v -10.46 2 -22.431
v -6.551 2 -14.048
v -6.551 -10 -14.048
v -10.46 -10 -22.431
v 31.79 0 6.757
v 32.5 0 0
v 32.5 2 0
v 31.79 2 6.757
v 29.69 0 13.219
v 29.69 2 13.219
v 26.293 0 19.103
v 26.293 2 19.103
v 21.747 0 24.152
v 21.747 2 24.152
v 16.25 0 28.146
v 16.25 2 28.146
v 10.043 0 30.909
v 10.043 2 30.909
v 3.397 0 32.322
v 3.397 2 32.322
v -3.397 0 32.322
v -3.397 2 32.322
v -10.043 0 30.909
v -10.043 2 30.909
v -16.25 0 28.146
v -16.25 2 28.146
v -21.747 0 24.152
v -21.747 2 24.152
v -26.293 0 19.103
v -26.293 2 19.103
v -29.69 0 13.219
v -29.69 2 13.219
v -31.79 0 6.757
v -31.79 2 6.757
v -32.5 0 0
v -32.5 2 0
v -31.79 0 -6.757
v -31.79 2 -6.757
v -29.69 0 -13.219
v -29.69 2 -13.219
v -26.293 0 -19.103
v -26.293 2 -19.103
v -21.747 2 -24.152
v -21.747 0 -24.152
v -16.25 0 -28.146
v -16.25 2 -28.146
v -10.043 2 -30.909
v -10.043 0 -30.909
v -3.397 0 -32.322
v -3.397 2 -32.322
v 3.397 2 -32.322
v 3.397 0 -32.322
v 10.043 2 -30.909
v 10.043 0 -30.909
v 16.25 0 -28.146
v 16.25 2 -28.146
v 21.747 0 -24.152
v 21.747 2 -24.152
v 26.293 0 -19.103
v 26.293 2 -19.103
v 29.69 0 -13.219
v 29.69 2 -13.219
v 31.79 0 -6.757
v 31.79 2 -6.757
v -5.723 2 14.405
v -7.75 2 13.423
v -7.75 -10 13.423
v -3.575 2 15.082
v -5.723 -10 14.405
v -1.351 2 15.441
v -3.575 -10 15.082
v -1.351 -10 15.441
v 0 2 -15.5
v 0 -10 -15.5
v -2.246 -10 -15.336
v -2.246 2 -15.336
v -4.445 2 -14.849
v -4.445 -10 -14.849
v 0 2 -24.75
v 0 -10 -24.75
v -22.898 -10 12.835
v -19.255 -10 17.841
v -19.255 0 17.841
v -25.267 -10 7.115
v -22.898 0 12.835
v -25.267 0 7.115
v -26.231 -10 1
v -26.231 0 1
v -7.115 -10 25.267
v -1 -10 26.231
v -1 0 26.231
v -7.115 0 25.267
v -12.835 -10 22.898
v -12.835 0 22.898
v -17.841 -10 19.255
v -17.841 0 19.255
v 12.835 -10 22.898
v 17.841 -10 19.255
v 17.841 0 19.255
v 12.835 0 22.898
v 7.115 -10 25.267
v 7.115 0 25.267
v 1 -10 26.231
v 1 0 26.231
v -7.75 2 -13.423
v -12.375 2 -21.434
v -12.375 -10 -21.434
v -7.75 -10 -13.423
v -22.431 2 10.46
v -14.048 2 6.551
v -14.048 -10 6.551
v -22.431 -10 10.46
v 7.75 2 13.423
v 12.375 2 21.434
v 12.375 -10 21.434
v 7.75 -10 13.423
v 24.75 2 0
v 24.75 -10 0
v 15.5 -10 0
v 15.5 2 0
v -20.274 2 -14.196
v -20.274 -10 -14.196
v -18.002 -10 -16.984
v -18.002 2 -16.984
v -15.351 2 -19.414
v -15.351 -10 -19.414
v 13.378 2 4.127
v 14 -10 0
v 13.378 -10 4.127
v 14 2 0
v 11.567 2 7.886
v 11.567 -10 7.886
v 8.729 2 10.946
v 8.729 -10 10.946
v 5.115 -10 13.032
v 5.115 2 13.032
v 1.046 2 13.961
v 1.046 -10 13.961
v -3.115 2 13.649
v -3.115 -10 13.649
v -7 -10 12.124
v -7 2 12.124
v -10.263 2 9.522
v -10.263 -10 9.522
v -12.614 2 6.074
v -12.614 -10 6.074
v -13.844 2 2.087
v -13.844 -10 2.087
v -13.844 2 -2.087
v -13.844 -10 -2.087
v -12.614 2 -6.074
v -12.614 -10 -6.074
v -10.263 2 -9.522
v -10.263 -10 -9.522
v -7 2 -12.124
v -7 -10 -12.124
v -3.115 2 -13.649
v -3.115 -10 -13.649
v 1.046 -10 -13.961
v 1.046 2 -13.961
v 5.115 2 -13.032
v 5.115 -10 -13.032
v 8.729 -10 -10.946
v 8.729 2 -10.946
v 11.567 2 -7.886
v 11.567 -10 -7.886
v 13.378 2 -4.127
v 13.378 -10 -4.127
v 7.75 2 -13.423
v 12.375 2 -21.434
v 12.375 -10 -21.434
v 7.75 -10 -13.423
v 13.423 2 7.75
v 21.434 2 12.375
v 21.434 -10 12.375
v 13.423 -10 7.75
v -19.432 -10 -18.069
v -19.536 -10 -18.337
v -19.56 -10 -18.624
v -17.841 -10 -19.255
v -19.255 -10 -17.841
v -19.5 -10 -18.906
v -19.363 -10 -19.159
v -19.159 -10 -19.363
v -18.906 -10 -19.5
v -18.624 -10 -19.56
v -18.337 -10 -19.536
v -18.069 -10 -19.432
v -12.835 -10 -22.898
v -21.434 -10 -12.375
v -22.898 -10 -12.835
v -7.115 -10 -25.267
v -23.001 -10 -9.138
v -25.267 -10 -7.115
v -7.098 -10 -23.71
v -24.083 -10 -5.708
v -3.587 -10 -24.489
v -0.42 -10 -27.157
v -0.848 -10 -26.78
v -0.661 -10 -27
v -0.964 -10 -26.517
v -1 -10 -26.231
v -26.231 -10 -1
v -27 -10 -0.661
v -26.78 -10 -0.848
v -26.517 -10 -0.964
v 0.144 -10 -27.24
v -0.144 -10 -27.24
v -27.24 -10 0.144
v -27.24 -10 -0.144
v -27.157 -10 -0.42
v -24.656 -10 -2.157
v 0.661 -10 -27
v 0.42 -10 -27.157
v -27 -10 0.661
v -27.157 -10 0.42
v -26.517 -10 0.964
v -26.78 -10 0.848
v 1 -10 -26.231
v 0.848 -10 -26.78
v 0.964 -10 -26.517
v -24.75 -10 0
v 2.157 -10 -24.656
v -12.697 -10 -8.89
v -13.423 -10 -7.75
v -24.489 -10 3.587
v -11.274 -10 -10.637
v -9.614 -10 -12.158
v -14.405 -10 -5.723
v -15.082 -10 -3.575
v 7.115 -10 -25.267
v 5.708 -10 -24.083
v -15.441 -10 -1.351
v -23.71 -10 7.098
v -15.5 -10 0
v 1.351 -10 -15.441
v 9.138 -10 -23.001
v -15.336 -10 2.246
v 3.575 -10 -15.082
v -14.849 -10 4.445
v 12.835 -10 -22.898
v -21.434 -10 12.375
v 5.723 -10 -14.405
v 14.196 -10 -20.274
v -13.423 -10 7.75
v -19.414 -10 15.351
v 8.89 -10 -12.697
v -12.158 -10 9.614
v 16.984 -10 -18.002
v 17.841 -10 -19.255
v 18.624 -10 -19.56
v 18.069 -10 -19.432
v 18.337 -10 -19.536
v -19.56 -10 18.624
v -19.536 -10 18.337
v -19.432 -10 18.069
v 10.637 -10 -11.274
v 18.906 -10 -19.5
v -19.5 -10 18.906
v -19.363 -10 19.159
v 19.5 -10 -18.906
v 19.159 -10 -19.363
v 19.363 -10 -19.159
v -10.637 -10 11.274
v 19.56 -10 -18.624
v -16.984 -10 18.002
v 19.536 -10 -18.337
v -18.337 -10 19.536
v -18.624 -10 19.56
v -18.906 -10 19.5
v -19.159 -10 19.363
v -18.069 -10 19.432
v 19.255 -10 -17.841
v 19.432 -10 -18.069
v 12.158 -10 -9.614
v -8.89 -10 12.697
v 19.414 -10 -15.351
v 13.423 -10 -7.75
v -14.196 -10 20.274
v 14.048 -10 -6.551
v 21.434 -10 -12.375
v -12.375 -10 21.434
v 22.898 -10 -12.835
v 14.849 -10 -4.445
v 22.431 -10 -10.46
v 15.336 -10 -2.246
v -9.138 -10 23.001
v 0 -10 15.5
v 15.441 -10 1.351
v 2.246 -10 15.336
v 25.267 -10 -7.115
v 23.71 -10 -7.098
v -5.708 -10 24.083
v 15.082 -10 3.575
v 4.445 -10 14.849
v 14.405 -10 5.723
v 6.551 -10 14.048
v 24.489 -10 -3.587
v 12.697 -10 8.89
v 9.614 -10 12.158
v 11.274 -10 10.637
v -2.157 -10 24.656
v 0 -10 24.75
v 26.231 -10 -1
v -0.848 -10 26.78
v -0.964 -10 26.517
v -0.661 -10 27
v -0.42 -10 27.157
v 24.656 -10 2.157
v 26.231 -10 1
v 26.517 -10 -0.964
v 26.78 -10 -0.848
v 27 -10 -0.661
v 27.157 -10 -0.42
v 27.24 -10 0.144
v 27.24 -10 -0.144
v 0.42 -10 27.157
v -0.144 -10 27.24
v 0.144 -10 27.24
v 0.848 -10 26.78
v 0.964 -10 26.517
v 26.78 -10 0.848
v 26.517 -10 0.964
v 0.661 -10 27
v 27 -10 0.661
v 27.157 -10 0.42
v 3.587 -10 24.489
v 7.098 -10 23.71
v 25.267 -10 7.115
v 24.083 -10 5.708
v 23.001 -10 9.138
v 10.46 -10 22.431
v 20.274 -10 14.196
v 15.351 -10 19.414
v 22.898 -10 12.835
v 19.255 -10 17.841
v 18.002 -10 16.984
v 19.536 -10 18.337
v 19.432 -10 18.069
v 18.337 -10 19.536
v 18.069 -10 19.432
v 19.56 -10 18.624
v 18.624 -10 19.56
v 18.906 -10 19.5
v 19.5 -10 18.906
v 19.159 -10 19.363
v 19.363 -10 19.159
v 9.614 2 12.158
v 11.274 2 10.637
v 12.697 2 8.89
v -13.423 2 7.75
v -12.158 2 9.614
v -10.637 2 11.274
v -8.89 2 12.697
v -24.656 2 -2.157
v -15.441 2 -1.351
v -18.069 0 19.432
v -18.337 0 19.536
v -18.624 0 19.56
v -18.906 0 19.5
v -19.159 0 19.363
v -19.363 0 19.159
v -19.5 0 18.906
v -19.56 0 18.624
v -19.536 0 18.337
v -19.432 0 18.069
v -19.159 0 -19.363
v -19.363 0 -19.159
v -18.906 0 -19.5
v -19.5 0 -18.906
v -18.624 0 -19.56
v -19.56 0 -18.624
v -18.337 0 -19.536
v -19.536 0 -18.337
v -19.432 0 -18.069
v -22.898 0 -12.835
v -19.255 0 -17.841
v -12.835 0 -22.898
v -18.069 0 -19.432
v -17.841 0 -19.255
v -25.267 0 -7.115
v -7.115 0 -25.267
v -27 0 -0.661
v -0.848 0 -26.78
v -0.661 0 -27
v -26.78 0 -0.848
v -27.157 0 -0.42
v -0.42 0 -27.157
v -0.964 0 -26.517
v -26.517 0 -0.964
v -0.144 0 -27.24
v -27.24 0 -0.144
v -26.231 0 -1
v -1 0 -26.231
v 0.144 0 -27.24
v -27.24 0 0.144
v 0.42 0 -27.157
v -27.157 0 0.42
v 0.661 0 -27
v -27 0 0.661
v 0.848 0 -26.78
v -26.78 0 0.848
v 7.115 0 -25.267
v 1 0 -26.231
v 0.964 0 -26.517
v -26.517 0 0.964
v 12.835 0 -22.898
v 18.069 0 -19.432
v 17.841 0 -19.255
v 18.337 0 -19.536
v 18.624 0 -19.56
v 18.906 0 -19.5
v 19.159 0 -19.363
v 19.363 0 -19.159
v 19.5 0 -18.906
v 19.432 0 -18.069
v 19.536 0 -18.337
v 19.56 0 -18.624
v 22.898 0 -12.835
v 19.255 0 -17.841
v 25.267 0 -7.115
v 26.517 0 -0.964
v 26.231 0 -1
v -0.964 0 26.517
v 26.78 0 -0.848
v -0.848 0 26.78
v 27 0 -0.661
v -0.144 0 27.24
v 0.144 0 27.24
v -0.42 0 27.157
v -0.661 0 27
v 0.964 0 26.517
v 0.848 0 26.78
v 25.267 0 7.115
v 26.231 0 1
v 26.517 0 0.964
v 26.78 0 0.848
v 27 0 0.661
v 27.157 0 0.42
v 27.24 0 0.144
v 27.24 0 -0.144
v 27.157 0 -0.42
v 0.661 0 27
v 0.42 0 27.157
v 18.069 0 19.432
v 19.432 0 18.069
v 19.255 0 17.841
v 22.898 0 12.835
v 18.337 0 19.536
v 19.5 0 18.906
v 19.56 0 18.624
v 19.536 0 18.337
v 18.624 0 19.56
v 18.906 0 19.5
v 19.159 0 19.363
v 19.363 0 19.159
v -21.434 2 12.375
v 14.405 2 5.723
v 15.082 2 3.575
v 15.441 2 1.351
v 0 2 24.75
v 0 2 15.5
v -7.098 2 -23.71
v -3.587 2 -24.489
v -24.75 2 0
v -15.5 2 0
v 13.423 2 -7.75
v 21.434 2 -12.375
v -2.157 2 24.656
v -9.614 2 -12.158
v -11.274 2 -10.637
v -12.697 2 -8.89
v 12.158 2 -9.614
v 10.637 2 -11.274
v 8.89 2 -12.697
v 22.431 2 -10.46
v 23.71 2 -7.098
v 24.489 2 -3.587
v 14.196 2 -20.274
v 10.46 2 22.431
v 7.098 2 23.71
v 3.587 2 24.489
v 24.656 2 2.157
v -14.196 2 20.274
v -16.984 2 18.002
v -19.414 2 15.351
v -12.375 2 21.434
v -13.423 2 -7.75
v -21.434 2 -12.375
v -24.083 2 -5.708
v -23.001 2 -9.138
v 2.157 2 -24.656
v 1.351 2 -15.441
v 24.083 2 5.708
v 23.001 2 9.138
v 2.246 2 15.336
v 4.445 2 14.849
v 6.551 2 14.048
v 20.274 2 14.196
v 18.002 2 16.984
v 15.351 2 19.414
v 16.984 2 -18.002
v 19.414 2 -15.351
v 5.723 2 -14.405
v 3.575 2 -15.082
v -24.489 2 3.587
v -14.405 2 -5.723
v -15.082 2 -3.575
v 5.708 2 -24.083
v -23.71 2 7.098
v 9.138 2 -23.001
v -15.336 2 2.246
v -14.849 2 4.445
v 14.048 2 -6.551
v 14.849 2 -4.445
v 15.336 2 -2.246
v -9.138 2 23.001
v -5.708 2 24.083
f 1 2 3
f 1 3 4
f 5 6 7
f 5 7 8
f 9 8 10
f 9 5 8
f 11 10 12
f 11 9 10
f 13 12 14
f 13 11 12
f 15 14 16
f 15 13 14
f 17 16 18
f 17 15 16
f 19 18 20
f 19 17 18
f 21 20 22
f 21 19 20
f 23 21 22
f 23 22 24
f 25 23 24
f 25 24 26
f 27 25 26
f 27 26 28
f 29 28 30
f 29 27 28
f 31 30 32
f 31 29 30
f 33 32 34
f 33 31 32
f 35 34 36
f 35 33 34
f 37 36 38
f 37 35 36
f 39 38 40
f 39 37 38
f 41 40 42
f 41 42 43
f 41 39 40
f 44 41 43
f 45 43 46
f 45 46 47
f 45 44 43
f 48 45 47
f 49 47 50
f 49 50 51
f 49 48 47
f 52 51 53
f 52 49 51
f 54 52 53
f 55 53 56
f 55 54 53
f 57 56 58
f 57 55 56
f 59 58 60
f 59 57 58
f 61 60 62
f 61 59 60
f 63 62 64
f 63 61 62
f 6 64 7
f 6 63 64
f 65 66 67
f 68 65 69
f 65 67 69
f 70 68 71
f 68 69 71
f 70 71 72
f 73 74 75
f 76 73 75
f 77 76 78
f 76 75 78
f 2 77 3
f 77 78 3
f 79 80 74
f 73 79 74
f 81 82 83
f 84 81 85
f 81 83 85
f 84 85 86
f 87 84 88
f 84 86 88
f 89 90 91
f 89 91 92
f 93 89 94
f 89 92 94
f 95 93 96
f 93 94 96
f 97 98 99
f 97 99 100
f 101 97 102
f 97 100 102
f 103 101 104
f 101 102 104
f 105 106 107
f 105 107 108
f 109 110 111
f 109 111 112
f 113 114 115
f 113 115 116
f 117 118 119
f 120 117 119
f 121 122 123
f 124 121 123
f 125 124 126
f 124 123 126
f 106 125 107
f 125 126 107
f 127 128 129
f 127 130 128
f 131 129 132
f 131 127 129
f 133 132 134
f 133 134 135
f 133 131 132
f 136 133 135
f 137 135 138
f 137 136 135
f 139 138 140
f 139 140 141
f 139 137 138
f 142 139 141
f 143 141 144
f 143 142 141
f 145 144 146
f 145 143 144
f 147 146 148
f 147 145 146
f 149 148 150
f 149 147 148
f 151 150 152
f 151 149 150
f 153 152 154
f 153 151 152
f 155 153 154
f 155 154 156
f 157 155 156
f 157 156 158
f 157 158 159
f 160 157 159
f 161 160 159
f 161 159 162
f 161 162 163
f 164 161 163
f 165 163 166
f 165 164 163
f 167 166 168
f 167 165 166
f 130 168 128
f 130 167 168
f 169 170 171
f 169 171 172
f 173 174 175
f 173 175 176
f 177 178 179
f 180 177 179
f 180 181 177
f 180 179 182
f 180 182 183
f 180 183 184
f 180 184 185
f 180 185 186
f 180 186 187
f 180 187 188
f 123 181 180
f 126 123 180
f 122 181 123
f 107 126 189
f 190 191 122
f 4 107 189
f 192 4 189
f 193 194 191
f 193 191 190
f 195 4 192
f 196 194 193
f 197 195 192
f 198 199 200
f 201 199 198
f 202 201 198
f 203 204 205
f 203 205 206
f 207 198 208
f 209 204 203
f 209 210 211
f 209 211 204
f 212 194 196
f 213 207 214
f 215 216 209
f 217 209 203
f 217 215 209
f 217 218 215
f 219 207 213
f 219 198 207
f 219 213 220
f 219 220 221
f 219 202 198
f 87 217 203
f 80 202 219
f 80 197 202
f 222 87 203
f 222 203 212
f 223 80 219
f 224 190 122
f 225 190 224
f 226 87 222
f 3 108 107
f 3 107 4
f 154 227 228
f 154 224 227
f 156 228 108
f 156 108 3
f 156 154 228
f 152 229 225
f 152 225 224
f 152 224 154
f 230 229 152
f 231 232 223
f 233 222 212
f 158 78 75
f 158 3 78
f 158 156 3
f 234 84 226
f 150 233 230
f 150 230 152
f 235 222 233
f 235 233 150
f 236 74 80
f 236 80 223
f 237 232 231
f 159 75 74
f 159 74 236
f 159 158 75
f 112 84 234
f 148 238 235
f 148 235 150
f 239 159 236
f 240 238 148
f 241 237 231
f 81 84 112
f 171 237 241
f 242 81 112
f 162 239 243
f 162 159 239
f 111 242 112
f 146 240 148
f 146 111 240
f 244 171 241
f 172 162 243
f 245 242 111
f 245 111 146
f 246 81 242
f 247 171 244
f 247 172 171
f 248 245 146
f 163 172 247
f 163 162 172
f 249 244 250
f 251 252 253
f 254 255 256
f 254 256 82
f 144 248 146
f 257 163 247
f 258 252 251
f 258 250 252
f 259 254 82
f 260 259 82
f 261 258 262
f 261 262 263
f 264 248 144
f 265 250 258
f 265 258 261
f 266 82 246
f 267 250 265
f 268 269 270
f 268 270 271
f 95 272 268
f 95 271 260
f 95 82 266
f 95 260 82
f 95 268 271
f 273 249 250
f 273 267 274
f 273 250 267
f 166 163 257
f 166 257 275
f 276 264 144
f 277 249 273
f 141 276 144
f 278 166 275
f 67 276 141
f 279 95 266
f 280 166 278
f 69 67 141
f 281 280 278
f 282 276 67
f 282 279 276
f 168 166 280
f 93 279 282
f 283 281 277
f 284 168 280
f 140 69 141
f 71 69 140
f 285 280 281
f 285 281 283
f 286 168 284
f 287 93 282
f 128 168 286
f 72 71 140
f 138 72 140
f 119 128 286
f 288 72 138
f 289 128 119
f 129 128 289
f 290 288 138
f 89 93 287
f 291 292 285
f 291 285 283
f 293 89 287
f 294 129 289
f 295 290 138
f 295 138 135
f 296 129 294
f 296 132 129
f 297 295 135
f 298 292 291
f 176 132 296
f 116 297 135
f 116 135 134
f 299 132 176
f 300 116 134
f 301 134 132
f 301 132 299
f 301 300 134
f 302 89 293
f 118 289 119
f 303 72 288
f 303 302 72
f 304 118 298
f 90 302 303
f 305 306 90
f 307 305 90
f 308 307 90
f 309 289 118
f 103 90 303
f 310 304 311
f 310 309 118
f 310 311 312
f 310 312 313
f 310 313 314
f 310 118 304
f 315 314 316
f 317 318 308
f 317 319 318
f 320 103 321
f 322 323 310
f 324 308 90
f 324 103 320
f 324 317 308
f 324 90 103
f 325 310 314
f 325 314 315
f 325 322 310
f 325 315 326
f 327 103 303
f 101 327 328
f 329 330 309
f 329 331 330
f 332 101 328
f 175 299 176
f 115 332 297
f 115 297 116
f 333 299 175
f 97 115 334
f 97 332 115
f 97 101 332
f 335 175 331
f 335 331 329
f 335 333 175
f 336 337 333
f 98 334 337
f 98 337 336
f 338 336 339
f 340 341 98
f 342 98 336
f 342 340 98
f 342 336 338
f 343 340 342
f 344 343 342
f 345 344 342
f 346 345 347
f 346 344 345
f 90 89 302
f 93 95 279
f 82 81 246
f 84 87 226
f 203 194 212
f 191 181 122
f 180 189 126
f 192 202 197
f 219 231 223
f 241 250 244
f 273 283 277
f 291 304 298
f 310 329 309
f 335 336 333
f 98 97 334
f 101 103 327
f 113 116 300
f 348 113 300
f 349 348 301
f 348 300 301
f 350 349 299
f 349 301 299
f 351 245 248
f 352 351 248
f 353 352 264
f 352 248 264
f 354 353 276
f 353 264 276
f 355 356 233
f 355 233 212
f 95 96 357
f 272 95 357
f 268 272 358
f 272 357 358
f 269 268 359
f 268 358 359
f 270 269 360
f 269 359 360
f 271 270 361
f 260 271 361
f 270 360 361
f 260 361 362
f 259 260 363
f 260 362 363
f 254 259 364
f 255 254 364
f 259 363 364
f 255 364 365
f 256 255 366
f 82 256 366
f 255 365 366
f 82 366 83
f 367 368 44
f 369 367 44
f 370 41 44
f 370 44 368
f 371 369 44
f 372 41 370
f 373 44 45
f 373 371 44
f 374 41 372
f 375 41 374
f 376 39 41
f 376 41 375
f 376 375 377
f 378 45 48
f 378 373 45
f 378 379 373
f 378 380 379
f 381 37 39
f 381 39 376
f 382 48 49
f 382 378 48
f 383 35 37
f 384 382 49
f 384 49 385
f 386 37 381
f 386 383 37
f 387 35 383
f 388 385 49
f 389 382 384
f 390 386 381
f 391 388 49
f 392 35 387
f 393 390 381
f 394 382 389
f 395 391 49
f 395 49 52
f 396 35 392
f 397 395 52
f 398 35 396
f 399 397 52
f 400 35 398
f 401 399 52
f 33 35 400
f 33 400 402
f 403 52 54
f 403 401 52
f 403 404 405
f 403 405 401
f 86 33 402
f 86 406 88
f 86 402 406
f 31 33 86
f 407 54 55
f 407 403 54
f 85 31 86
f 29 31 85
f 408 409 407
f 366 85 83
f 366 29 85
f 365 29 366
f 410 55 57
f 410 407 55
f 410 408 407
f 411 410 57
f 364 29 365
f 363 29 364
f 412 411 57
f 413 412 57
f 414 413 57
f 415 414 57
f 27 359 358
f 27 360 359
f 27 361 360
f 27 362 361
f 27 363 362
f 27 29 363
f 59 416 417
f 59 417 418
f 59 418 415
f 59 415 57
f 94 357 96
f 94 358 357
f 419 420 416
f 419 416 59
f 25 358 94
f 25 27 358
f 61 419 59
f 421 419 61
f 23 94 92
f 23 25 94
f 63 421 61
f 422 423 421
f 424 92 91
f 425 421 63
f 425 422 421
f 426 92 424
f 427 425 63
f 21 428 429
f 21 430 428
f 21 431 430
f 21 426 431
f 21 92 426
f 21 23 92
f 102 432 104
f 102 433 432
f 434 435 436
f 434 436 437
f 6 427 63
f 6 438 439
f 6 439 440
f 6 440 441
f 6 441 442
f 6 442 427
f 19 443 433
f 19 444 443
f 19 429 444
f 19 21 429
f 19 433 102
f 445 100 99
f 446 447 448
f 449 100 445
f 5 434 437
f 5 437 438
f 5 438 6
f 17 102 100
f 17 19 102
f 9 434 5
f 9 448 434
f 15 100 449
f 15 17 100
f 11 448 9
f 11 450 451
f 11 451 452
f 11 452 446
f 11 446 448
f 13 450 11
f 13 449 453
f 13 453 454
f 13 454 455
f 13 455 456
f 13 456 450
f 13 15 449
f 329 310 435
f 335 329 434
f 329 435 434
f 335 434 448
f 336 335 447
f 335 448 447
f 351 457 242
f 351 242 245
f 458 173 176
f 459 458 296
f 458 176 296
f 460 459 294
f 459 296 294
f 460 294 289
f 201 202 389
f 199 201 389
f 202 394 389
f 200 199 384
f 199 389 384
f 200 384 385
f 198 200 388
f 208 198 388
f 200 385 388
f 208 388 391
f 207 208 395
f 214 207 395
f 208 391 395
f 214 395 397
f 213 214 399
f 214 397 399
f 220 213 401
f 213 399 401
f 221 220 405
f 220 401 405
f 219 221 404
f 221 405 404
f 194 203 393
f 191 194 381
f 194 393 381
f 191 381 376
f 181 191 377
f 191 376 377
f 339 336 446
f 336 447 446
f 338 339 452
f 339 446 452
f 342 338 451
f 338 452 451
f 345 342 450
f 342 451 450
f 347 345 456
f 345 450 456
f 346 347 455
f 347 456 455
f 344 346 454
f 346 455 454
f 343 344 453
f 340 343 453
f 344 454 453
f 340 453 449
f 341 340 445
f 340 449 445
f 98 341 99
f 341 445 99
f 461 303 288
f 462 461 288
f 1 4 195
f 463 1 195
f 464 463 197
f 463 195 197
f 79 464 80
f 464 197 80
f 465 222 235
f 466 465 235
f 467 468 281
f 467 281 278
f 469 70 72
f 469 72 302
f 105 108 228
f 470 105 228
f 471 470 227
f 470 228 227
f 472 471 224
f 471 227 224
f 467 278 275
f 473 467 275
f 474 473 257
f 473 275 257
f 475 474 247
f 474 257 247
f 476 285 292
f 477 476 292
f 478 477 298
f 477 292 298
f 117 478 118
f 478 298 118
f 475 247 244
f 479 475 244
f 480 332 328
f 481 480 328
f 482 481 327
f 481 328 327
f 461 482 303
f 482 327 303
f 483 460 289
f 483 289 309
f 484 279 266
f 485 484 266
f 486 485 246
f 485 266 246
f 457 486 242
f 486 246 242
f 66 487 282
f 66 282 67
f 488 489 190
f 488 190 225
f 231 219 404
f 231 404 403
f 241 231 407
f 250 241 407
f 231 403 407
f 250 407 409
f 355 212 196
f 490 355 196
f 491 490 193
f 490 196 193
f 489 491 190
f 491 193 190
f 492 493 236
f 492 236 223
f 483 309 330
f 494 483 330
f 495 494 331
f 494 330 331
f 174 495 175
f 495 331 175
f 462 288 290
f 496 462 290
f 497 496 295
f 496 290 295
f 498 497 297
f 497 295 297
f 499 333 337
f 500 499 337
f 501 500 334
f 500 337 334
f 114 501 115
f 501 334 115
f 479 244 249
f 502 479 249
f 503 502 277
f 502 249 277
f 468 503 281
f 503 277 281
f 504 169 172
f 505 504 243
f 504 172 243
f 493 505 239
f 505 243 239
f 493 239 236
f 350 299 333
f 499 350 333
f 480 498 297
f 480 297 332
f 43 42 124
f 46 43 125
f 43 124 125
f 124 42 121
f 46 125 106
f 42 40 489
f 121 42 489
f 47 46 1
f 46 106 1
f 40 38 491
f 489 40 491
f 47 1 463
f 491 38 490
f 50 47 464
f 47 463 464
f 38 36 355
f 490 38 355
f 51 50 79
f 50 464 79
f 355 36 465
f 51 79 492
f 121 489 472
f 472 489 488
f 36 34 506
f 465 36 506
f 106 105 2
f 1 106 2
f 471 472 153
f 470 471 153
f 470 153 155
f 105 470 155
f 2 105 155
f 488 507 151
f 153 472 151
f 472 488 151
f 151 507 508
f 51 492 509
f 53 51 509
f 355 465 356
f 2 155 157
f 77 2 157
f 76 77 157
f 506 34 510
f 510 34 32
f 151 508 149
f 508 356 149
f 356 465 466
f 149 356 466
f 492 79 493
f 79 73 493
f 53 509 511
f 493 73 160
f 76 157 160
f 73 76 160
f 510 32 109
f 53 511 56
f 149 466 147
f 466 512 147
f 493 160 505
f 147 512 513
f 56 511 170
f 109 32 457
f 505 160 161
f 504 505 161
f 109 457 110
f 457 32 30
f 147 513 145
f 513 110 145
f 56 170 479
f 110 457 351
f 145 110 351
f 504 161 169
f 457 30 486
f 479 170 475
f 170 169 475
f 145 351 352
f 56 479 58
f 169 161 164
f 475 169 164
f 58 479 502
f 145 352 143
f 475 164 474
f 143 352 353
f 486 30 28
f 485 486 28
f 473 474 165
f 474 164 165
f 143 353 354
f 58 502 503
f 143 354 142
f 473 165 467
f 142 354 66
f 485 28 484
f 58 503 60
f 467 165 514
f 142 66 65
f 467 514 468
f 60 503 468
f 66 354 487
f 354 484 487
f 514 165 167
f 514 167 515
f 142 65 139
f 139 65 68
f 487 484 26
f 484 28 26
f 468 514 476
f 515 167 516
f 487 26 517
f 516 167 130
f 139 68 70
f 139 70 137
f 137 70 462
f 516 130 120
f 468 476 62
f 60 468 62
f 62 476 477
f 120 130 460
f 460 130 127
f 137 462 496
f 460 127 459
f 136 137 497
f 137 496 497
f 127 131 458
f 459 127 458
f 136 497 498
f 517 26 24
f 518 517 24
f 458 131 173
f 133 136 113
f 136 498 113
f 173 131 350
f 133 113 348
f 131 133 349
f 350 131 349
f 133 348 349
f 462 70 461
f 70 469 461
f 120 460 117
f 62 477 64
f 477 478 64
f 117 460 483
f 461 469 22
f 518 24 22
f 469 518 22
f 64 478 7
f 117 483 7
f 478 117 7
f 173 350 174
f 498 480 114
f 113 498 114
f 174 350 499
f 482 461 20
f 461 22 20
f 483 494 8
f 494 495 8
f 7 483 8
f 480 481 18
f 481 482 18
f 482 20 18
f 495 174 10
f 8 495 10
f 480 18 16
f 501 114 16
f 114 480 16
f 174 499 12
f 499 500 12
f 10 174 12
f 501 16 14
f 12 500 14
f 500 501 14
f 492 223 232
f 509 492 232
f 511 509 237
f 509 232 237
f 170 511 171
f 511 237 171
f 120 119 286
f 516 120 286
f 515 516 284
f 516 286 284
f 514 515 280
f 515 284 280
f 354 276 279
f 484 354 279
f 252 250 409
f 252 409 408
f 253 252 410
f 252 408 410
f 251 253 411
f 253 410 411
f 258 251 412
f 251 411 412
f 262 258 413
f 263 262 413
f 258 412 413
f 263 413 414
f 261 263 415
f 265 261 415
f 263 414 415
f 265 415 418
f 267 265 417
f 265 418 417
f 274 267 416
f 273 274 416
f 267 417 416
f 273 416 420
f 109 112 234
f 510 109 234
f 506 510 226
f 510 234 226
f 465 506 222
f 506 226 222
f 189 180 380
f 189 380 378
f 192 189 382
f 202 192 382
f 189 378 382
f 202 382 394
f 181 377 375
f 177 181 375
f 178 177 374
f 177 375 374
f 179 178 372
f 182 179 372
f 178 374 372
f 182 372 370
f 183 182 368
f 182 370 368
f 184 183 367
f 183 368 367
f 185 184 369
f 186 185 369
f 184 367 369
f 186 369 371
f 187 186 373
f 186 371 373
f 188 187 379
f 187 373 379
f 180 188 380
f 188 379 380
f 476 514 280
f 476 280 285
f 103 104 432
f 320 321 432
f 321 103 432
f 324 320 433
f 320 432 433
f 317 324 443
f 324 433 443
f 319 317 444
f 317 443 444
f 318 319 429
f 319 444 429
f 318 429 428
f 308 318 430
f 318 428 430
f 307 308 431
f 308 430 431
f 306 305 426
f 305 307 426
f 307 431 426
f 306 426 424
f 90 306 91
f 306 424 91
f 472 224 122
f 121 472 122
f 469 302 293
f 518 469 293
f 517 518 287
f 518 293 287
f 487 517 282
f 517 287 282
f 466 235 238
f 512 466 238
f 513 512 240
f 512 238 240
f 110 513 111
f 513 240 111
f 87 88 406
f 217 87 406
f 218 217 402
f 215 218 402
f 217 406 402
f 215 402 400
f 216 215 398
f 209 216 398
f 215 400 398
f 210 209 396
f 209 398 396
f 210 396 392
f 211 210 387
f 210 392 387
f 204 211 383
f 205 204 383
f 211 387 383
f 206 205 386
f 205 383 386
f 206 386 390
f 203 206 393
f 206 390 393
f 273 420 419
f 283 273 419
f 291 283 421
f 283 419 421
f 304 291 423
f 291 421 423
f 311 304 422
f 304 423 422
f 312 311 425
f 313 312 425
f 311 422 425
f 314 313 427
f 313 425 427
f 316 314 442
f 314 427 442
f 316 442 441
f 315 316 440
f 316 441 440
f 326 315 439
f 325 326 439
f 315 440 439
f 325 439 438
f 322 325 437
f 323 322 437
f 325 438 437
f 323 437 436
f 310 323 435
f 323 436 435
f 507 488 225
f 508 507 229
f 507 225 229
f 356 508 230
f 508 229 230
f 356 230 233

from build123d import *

# Parameters (mm, degrees)
F0_R     = 26.25
F0_R_2   = 14
F1_DEPTH = 10
F2_R     = 32.5
F2_R_2   = 14
F3_DEPTH = 2
F4_R     = 1
F5_DEPTH = 10
F7_DEPTH = 25


with BuildPart() as f1:
    # F0 (on Front) → F1 (new body)
    with BuildSketch(Plane.XZ):
        Circle(F0_R)
        Circle(F0_R_2, mode=Mode.SUBTRACT)
    extrude(amount=F1_DEPTH)

    # F2 (on Front) → F3 (join)
    with BuildSketch(Plane.XZ):
        Circle(F2_R)
        Circle(F2_R_2, mode=Mode.SUBTRACT)
    extrude(amount=-F3_DEPTH)

    # F4 (on face) → F5 (join, through all)
    with BuildSketch(Plane.XZ):
        with Locations((0, 26.25)):
            Circle(F4_R)
        with Locations((26.25, 0)):
            Circle(F4_R)
        with Locations((0, -26.25)):
            Circle(F4_R)
        with Locations((-26.25, 0)):
            Circle(F4_R)
        with Locations((-18.561553, 18.561553)):
            Circle(F4_R)
        with Locations((-18.561553, -18.561553)):
            Circle(F4_R)
        with Locations((18.561553, -18.561553)):
            Circle(F4_R)
        with Locations((18.561553, 18.561553)):
            Circle(F4_R)
    extrude(amount=F5_DEPTH)

    # F6 (on face) → F7 (cut)
    with BuildSketch(Plane.XZ.offset(10)):
        with BuildLine():
            ThreePointArc((-24.655819, -2.157105), (-23.604495, -7.442469), (-21.434129, -12.375))
            Line((-21.434129, -12.375), (-13.423394, -7.75))
            ThreePointArc((-13.423394, -7.75), (-14.782613, -4.66094), (-15.441018, -1.350914))
            Line((-15.441018, -1.350914), (-24.655819, -2.157105))
        make_face()
        with BuildLine():
            ThreePointArc((-20.274013, -14.196017), (-16.720858, -18.247614), (-12.375, -21.434129))
            Line((-12.375, -21.434129), (-7.75, -13.423394))
            ThreePointArc((-7.75, -13.423394), (-10.471648, -11.427799), (-12.696857, -8.890435))
            Line((-12.696857, -8.890435), (-20.274013, -14.196017))
        make_face()
        with BuildLine():
            ThreePointArc((-10.459802, -22.431118), (-5.35688, -24.163326), (0, -24.75))
            Line((0, -24.75), (0, -15.5))
            ThreePointArc((0, -15.5), (-3.354814, -15.132588), (-6.550583, -14.047771))
            Line((-6.550583, -14.047771), (-10.459802, -22.431118))
        make_face()
        with BuildLine():
            ThreePointArc((2.157105, -24.655819), (7.442469, -23.604495), (12.375, -21.434129))
            Line((12.375, -21.434129), (7.75, -13.423394))
            ThreePointArc((7.75, -13.423394), (4.66094, -14.782613), (1.350914, -15.441018))
            Line((1.350914, -15.441018), (2.157105, -24.655819))
        make_face()
        with BuildLine():
            ThreePointArc((14.196017, -20.274013), (18.247614, -16.720858), (21.434129, -12.375))
            Line((21.434129, -12.375), (13.423394, -7.75))
            ThreePointArc((13.423394, -7.75), (11.427799, -10.471648), (8.890435, -12.696857))
            Line((8.890435, -12.696857), (14.196017, -20.274013))
        make_face()
        with BuildLine():
            ThreePointArc((22.431118, -10.459802), (24.163326, -5.35688), (24.75, 0))
            Line((24.75, 0), (15.5, 0))
            ThreePointArc((15.5, 0), (15.132588, -3.354814), (14.047771, -6.550583))
            Line((14.047771, -6.550583), (22.431118, -10.459802))
        make_face()
        with BuildLine():
            ThreePointArc((24.655819, 2.157105), (23.604495, 7.442469), (21.434129, 12.375))
            Line((21.434129, 12.375), (13.423394, 7.75))
            ThreePointArc((13.423394, 7.75), (14.782613, 4.66094), (15.441018, 1.350914))
            Line((15.441018, 1.350914), (24.655819, 2.157105))
        make_face()
        with BuildLine():
            ThreePointArc((20.274013, 14.196017), (16.720858, 18.247614), (12.375, 21.434129))
            Line((12.375, 21.434129), (7.75, 13.423394))
            ThreePointArc((7.75, 13.423394), (10.471648, 11.427799), (12.696857, 8.890435))
            Line((12.696857, 8.890435), (20.274013, 14.196017))
        make_face()
        with BuildLine():
            ThreePointArc((10.459802, 22.431118), (5.35688, 24.163326), (0, 24.75))
            Line((0, 24.75), (0, 15.5))
            ThreePointArc((0, 15.5), (3.354814, 15.132588), (6.550583, 14.047771))
            Line((6.550583, 14.047771), (10.459802, 22.431118))
        make_face()
        with BuildLine():
            ThreePointArc((-2.157105, 24.655819), (-7.442469, 23.604495), (-12.375, 21.434129))
            Line((-12.375, 21.434129), (-7.75, 13.423394))
            ThreePointArc((-7.75, 13.423394), (-4.66094, 14.782613), (-1.350914, 15.441018))
            Line((-1.350914, 15.441018), (-2.157105, 24.655819))
        make_face()
        with BuildLine():
            ThreePointArc((-14.196017, 20.274013), (-18.247614, 16.720858), (-21.434129, 12.375))
            Line((-21.434129, 12.375), (-13.423394, 7.75))
            ThreePointArc((-13.423394, 7.75), (-11.427799, 10.471648), (-8.890435, 12.696857))
            Line((-8.890435, 12.696857), (-14.196017, 20.274013))
        make_face()
        with BuildLine():
            ThreePointArc((-22.431118, 10.459802), (-24.163326, 5.35688), (-24.75, 0))
            Line((-24.75, 0), (-15.5, 0))
            ThreePointArc((-15.5, 0), (-15.132588, 3.354814), (-14.047771, 6.550583))
            Line((-14.047771, 6.550583), (-22.431118, 10.459802))
        make_face()
    extrude(amount=-F7_DEPTH, mode=Mode.SUBTRACT)


solid = f1.part
